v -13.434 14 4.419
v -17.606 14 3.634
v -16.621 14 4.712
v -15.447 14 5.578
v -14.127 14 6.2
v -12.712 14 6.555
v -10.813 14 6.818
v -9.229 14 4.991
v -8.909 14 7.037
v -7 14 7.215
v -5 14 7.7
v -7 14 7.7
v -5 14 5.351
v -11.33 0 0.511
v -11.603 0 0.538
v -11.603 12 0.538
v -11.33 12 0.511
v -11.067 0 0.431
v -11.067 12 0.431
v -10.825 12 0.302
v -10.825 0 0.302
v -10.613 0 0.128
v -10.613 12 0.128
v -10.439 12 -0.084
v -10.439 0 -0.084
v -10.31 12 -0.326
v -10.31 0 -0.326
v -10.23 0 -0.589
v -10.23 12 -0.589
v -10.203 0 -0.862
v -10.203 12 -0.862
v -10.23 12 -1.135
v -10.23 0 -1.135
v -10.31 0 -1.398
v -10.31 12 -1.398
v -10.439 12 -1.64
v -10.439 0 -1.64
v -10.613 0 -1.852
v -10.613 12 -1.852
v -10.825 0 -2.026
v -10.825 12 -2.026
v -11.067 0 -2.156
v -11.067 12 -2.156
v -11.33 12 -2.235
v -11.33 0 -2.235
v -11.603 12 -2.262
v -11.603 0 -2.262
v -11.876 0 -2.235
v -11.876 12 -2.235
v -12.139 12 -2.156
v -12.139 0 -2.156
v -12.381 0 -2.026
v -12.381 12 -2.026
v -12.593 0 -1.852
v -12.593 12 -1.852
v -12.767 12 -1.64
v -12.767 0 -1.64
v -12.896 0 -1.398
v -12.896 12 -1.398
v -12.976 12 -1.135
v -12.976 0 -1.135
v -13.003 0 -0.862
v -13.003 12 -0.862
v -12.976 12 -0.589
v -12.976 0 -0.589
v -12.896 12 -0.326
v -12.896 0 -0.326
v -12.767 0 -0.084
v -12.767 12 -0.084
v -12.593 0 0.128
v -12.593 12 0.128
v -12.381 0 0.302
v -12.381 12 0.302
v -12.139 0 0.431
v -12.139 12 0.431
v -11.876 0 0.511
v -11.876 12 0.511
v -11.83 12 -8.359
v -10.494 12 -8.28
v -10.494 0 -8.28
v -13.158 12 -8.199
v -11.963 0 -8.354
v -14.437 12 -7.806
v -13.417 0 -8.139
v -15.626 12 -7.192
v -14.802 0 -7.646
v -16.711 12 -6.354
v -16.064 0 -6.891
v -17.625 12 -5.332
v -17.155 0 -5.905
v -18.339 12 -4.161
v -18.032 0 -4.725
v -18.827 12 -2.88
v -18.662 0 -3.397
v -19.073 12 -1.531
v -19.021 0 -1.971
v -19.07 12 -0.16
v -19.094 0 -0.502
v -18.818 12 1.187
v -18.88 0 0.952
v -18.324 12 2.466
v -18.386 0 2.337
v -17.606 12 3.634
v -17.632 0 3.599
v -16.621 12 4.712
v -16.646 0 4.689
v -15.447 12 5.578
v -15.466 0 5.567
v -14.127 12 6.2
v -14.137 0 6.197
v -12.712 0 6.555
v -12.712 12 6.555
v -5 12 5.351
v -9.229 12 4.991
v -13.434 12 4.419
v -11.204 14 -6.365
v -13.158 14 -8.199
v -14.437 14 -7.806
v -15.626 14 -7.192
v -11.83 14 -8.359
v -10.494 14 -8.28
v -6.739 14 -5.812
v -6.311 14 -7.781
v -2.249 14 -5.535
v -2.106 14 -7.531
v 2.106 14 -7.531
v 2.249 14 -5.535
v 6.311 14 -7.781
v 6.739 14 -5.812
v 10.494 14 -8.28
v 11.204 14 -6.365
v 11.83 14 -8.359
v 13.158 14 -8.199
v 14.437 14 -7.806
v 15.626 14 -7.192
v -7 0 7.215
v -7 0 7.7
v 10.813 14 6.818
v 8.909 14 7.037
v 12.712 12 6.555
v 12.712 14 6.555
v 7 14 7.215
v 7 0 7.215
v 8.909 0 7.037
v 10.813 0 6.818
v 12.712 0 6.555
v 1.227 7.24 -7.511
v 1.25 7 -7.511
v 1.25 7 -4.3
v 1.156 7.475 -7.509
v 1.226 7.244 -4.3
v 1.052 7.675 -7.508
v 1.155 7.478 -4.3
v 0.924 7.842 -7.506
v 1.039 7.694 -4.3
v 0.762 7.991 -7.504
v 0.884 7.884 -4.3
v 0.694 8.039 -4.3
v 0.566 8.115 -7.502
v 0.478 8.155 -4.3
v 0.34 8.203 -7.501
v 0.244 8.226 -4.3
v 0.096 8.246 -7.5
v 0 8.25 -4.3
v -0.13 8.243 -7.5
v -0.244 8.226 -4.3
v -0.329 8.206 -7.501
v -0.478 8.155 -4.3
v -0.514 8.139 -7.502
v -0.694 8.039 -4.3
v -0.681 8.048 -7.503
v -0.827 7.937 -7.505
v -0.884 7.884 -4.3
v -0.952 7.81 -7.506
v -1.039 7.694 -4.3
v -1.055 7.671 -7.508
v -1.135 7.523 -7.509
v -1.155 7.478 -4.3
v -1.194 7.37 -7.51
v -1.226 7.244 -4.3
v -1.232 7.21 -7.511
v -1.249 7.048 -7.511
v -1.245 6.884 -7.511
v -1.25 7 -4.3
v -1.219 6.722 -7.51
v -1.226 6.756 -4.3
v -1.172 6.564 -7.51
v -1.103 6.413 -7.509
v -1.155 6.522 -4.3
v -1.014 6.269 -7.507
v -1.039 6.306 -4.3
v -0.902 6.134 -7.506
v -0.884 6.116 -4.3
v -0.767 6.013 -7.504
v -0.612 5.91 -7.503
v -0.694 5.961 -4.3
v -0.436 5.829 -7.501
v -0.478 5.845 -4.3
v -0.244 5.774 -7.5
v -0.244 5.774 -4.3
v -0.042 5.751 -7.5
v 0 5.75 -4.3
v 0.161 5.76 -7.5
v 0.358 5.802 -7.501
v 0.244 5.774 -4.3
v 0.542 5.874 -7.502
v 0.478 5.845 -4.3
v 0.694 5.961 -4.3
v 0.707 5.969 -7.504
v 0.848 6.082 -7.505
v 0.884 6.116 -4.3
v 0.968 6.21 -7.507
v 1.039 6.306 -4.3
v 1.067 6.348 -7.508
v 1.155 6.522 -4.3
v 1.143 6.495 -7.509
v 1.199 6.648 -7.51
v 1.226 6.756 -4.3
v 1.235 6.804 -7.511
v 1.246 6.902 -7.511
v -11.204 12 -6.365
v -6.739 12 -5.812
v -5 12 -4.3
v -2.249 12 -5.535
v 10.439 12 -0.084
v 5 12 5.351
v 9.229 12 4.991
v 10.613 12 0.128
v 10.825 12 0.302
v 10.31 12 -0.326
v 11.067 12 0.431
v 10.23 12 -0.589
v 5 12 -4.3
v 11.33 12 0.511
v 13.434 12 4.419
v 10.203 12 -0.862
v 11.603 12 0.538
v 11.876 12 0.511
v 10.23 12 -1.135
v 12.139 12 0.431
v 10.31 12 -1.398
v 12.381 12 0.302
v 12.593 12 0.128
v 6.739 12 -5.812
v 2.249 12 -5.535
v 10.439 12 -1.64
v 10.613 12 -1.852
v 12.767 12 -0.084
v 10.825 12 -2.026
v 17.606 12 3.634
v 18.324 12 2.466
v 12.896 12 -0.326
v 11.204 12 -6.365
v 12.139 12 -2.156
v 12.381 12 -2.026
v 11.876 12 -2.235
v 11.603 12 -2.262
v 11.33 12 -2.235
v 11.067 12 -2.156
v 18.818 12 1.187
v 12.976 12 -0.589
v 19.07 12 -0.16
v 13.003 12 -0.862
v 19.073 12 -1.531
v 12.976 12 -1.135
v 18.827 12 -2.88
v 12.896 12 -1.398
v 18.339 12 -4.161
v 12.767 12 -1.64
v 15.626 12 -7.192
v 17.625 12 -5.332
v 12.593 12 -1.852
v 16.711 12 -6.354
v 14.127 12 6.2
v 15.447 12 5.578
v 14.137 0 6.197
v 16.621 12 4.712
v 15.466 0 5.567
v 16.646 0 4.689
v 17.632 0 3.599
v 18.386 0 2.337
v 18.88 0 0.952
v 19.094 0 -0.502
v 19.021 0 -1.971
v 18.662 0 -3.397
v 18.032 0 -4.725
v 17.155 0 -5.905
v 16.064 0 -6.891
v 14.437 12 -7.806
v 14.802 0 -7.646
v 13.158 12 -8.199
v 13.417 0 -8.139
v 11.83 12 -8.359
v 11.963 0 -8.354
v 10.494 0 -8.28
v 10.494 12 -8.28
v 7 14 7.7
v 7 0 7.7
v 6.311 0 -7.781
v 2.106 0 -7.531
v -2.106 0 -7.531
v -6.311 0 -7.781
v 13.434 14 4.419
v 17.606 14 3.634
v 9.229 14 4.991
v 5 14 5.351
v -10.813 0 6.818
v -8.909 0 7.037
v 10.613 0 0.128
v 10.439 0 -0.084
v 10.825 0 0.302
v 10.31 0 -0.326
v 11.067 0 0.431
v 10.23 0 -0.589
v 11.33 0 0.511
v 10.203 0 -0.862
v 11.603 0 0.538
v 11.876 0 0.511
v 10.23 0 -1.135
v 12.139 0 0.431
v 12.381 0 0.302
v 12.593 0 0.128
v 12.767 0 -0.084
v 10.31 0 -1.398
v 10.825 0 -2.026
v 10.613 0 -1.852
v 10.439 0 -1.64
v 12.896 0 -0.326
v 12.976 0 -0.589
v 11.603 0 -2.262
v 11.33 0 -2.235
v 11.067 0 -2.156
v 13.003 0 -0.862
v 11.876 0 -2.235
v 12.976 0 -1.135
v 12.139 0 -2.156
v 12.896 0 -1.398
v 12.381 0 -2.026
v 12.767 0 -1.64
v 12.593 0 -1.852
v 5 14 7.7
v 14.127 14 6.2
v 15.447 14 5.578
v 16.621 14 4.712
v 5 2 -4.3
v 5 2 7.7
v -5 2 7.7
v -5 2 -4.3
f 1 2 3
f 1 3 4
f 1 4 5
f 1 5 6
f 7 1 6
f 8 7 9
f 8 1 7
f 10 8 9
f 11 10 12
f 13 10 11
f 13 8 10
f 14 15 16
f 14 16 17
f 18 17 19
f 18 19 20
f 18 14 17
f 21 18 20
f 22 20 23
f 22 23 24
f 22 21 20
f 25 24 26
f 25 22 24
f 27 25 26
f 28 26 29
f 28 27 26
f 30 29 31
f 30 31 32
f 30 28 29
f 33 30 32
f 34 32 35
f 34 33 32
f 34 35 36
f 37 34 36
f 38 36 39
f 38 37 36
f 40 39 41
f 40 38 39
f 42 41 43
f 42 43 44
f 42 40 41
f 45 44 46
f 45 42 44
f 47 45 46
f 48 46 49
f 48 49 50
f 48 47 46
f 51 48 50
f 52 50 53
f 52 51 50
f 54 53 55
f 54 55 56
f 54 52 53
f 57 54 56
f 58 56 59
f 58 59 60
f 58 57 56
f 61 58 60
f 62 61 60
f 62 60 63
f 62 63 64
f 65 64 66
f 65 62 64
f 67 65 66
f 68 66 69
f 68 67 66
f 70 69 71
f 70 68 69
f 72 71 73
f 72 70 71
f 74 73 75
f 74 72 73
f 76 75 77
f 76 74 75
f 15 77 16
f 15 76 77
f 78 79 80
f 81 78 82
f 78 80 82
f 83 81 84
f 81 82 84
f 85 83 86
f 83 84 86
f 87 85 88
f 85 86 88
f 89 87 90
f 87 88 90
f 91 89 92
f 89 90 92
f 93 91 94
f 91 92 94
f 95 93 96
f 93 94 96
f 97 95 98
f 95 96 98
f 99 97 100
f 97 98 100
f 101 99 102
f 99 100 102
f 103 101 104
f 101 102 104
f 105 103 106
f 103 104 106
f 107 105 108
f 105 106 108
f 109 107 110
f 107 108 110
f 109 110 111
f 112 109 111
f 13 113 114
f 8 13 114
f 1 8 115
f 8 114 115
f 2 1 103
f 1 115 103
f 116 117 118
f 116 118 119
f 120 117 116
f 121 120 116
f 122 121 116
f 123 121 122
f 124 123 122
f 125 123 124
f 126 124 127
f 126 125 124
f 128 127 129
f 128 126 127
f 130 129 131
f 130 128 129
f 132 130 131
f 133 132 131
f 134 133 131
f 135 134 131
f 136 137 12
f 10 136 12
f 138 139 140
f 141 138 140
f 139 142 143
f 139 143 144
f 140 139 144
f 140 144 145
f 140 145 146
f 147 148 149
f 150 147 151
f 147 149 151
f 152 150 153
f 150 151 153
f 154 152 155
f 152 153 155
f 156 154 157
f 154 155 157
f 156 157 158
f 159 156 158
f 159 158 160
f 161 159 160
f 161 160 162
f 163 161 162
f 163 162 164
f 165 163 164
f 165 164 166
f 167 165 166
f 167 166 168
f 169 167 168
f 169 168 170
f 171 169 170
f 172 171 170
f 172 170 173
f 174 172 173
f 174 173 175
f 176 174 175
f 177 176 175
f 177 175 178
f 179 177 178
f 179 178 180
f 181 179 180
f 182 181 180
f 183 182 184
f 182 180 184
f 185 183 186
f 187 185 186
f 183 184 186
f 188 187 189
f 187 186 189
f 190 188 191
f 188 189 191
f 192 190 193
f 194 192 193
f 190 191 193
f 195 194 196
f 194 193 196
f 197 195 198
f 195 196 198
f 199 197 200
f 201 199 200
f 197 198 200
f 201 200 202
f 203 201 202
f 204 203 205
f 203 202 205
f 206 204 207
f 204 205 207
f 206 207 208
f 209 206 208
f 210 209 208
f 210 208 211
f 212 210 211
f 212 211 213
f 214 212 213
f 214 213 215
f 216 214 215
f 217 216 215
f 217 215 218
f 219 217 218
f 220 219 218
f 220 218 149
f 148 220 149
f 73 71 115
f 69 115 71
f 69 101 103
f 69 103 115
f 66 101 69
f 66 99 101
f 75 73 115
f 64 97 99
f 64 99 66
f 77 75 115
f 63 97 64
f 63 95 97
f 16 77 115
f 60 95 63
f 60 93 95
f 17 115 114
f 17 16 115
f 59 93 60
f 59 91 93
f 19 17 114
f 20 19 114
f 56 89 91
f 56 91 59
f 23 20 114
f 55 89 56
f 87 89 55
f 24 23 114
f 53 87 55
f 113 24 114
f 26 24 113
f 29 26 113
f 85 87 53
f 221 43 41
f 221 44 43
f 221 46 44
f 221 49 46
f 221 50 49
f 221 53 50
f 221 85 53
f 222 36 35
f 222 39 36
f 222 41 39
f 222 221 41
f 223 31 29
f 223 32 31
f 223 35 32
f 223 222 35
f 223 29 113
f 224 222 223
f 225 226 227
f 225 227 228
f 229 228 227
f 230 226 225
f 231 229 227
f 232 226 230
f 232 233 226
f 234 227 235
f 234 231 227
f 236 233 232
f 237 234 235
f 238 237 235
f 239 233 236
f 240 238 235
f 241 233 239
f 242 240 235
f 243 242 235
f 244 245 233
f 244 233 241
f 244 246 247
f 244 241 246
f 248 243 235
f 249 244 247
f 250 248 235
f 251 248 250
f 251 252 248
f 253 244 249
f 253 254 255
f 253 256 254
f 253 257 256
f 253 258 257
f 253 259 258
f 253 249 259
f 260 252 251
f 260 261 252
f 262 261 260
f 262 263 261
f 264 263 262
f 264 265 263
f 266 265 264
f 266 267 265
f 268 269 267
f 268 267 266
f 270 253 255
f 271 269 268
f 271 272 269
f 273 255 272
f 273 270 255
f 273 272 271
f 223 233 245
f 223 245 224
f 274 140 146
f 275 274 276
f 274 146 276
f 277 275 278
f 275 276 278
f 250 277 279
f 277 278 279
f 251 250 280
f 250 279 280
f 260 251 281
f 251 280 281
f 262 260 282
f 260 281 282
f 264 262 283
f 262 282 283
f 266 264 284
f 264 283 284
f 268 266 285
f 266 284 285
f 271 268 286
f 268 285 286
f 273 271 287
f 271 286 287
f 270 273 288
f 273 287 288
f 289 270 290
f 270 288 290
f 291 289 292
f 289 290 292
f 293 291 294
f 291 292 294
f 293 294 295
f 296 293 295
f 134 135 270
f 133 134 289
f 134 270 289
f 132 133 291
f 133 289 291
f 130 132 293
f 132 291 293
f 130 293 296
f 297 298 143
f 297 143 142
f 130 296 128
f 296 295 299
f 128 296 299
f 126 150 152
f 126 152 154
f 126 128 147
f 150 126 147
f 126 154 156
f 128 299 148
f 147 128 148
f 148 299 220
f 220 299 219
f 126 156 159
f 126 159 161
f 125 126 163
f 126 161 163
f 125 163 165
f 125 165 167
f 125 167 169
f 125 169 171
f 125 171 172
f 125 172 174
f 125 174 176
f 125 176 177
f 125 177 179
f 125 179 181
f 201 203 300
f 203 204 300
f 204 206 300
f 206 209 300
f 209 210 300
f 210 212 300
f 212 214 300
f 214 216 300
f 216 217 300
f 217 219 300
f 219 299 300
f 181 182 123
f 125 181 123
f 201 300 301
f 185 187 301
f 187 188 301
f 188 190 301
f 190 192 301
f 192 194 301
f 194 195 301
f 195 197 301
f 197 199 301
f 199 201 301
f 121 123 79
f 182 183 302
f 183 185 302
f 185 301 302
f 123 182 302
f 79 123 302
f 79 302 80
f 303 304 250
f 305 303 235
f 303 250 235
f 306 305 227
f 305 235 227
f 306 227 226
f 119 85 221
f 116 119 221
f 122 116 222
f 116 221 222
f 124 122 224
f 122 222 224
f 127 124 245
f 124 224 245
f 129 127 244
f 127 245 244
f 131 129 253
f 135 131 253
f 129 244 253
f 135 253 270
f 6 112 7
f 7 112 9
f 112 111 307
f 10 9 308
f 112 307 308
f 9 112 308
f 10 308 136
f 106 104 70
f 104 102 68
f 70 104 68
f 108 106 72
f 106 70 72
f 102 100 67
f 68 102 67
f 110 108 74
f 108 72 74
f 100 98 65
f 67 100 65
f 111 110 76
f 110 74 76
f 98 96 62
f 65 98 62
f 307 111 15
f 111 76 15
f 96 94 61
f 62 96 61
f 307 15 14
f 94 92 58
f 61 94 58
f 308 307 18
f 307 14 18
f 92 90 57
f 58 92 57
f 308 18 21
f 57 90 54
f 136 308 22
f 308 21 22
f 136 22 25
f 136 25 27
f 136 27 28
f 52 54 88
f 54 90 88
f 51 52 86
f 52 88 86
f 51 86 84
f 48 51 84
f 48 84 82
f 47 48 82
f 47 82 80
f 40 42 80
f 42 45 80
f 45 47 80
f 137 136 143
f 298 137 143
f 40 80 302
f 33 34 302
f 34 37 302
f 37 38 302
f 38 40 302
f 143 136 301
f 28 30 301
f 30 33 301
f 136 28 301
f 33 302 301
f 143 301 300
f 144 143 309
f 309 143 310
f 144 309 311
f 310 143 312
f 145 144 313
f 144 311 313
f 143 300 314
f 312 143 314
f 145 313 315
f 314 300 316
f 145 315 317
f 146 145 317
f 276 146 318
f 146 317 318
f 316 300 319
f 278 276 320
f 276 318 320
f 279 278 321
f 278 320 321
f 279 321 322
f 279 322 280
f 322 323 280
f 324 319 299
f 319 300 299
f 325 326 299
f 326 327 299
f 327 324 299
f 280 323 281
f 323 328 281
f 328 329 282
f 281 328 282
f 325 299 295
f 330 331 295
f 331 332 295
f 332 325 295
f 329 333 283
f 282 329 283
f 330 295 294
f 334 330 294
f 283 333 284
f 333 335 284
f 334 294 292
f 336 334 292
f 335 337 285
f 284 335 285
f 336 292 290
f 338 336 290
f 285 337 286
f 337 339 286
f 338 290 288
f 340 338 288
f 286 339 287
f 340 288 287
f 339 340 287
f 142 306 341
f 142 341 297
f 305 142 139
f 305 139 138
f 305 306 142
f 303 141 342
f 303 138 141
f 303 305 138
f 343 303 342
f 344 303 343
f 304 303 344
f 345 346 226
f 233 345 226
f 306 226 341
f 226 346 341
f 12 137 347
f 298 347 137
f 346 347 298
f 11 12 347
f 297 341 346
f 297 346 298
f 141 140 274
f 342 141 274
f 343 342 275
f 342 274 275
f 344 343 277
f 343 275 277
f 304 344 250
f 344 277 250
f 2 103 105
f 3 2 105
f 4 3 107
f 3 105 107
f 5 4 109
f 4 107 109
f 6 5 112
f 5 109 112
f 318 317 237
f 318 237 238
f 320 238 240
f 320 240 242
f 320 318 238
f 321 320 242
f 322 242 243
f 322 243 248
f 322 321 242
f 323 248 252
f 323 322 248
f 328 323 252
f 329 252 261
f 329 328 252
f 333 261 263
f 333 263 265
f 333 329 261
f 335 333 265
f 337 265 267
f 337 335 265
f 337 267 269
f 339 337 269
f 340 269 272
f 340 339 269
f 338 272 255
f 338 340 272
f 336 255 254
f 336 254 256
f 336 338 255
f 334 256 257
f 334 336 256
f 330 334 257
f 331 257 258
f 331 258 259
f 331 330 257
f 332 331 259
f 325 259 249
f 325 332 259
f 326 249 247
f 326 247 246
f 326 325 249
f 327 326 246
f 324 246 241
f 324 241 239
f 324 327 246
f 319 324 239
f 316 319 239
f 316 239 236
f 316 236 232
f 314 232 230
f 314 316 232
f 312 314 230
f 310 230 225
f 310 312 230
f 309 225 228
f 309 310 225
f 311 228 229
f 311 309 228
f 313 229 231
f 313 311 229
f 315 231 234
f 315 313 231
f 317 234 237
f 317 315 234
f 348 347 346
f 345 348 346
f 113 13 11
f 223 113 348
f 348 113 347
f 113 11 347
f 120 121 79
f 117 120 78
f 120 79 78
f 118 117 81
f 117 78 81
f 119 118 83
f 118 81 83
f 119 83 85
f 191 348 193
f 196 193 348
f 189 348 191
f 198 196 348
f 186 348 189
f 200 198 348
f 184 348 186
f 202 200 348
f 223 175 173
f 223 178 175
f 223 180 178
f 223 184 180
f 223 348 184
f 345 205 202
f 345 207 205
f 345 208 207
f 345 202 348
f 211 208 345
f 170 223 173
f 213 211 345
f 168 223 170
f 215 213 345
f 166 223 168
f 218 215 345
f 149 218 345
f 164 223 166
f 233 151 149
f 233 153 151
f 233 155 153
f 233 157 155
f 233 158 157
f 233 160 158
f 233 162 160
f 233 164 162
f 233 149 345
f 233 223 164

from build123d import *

# Parameters (mm, degrees)
SKETCH2_R                = 1.4
BOSS_EXTRUDE1_DEPTH      = 12
BOSS_EXTRUDE5_DEPTH      = 2
BOSS_EXTRUDE2_REACH      = 30.617
BOSS_EXTRUDE2_END_RADIUS = 86
SKETCH3_W                = 14
SKETCH3_H                = 14
SKETCH15_W               = 10
SKETCH15_H               = 10
SKETCH15_H_2             = 2
CUT_EXTRUDE1_DEPTH       = 12
SKETCH16_R               = 1.25
CUT_EXTRUDE2_DEPTH       = 27.55044426


with BuildPart() as part:
    # Sketch2 → Boss-Extrude1 (new body)
    with BuildSketch(Plane(origin=(0, 0, 0), x_dir=(1, 0, 0), z_dir=(0, 1, 0))):
        with BuildLine():
            ThreePointArc((10.49446819, 8.279873701), (0, 7.5), (-10.49446819, 8.279873701))
            ThreePointArc((-10.49446819, 8.279873701), (-19.020657749, 1.97082531), (-12.711609357, -6.555364249))
            ThreePointArc((-12.711609357, -6.555364249), (0, -7.5), (12.711609357, -6.555364249))
            ThreePointArc((12.711609357, -6.555364249), (19.020657749, 1.97082531), (10.49446819, 8.279873701))
        make_face()
        with Locations(Location((-11.603038774, 0.862254726, 0), (0, 0, 270))):
            Circle(SKETCH2_R, mode=Mode.SUBTRACT)
        with Locations(Location((11.603038774, 0.862254726, 0), (0, 0, 270))):
            Circle(SKETCH2_R, mode=Mode.SUBTRACT)
    extrude(amount=BOSS_EXTRUDE1_DEPTH)

    # Sketch14 → Boss-Extrude5 (add)
    with BuildSketch(Plane(origin=(0, 12, 0), x_dir=(1, 0, 0), z_dir=(0, 1, 0))):
        with BuildLine():
            ThreePointArc((-10.49446819, 8.279873701), (-13.158435282, 8.199198347), (-15.625987479, 7.192016469))
            ThreePointArc((-15.625987479, 7.192016469), (0, 5.5), (15.625987479, 7.192016469))
            ThreePointArc((15.625987479, 7.192016469), (13.158435282, 8.199198347), (10.49446819, 8.279873701))
            ThreePointArc((10.49446819, 8.279873701), (0, 7.5), (-10.49446819, 8.279873701))
        make_face()
        with BuildLine():
            ThreePointArc((17.605627343, -3.634291778), (0, -5.5), (-17.605627343, -3.634291778))
            ThreePointArc((-17.605627343, -3.634291778), (-15.446905606, -5.577829728), (-12.711609357, -6.555364249))
            ThreePointArc((-12.711609357, -6.555364249), (0, -7.5), (12.711609357, -6.555364249))
            ThreePointArc((12.711609357, -6.555364249), (15.446905606, -5.577829728), (17.605627343, -3.634291778))
        make_face()
    extrude(amount=BOSS_EXTRUDE5_DEPTH)

    # Boss-Extrude2: up to this cylinder (the profile starts outside it)
    boss_extrude2_end = Plane(origin=(0, 7, -78.5), z_dir=(0, -1, 0)) * Cylinder(BOSS_EXTRUDE2_END_RADIUS, 234.234, mode=Mode.PRIVATE)
    # Sketch3 → Boss-Extrude2 (add, up to the surface)
    with BuildSketch(Plane.XY.offset(7.7), mode=Mode.PRIVATE) as boss_extrude2_sk1:
        with Locations((0, 7)):
            Rectangle(SKETCH3_W, SKETCH3_H)
    boss_extrude2_tool1 = extrude(boss_extrude2_sk1.sketch, amount=-BOSS_EXTRUDE2_REACH, mode=Mode.PRIVATE) - boss_extrude2_end
    add(boss_extrude2_tool1.solids().sort_by_distance((0, 7, 7.7))[0])

    # Sketch15 → Cut-Extrude1 (cut)
    with BuildSketch(Plane.XY.offset(7.7)):
        with Locations((0, 7)):
            Rectangle(SKETCH15_W, SKETCH15_H)
        with Locations((0, 13)):
            Rectangle(SKETCH15_W, SKETCH15_H_2)
    extrude(amount=-CUT_EXTRUDE1_DEPTH, mode=Mode.SUBTRACT)

    # Sketch16 → Cut-Extrude2 (cut, through all)
    with BuildSketch(Plane.XY.offset(-4.3)):
        with Locations((0, 7)):
            Circle(SKETCH16_R)
    extrude(amount=-CUT_EXTRUDE2_DEPTH, mode=Mode.SUBTRACT)


solid = part.part
